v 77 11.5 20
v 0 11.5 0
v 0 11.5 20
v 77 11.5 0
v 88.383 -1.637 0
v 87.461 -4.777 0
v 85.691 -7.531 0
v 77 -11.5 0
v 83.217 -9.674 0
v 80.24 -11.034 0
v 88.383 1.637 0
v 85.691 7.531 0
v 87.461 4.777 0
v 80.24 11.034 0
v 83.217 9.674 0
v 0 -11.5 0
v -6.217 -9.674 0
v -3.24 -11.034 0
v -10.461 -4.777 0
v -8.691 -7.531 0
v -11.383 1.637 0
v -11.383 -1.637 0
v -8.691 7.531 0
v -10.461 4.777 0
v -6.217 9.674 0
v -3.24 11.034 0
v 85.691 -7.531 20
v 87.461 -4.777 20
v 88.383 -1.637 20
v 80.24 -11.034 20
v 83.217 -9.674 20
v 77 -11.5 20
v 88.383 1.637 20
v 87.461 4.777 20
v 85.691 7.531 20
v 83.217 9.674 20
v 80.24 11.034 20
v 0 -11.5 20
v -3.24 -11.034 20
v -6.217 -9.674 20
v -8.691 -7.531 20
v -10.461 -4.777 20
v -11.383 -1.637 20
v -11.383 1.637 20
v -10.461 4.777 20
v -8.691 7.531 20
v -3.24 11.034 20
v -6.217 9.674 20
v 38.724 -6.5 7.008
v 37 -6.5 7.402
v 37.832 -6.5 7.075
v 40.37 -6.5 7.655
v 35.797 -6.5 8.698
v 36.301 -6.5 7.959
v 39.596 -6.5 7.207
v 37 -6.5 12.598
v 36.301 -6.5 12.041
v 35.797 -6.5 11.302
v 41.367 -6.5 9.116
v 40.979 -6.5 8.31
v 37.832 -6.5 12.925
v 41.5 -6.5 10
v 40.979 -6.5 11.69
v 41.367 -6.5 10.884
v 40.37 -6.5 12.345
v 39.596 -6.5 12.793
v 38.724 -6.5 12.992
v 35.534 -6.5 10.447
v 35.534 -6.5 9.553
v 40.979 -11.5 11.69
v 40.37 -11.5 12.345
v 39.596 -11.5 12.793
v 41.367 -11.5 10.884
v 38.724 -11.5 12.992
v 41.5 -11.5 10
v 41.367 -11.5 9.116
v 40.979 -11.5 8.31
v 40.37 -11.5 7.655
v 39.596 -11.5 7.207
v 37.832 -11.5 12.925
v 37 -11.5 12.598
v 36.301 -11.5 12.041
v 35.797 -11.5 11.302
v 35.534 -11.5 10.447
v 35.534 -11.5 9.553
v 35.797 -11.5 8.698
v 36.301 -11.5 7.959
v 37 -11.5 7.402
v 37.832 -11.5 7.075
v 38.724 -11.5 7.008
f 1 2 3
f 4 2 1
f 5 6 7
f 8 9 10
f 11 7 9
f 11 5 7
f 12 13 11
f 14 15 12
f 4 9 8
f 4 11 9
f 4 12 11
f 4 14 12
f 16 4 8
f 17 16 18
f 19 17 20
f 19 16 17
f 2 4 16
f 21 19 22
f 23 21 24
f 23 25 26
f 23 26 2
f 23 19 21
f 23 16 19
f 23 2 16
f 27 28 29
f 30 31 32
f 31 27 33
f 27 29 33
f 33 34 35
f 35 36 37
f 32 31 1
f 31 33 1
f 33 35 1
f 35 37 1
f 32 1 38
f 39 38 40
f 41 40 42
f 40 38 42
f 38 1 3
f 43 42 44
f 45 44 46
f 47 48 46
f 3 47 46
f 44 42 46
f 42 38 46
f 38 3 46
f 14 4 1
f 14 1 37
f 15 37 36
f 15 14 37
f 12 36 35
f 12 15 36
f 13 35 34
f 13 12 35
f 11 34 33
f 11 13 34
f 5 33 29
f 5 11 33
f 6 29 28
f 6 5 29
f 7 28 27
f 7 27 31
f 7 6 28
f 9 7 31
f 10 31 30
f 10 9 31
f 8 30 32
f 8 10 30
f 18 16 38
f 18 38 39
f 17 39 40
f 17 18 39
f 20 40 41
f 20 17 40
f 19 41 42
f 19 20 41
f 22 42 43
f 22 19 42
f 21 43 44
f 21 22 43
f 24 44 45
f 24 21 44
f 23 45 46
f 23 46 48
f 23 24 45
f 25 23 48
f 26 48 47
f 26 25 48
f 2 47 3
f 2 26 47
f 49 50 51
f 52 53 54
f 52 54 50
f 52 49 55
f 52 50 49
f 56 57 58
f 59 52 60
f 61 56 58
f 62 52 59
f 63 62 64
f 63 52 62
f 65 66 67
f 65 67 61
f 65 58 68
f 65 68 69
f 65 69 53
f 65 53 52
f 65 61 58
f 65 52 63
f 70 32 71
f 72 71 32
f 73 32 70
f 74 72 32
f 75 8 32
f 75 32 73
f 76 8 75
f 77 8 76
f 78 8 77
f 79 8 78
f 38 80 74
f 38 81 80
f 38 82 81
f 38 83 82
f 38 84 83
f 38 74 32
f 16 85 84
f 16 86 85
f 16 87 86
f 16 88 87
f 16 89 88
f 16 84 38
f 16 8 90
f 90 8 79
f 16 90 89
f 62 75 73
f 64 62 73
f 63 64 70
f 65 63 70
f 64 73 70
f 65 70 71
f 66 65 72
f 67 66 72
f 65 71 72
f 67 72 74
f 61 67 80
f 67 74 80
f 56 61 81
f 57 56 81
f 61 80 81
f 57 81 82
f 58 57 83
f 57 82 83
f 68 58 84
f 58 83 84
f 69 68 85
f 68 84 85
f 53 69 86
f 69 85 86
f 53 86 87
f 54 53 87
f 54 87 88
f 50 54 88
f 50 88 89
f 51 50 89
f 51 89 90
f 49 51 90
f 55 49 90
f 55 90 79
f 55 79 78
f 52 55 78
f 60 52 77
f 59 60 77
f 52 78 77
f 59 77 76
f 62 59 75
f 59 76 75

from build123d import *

# Parameters (mm, degrees)
BOSS_EXTRUDE1_DEPTH = 20
SKETCH3_R           = 3
CUT_EXTRUDE1_DEPTH  = 5


with BuildPart() as part:
    # Sketch2 → Boss-Extrude1 (new body)
    with BuildSketch(Plane.XY):
        with BuildLine():
            Line((0, 11.5), (77, 11.5))
            ThreePointArc((77, 11.5), (88.5, 0), (77, -11.5))
            Line((77, -11.5), (0, -11.5))
            ThreePointArc((0, -11.5), (-11.5, 0), (0, 11.5))
        make_face()
    extrude(amount=BOSS_EXTRUDE1_DEPTH)

    # Sketch3 → Cut-Extrude1 (cut)
    with BuildSketch(Plane.XZ.offset(11.5)):
        with Locations((38.5, 10)):
            Circle(SKETCH3_R)
    extrude(amount=-CUT_EXTRUDE1_DEPTH, mode=Mode.SUBTRACT)


solid = part.part
